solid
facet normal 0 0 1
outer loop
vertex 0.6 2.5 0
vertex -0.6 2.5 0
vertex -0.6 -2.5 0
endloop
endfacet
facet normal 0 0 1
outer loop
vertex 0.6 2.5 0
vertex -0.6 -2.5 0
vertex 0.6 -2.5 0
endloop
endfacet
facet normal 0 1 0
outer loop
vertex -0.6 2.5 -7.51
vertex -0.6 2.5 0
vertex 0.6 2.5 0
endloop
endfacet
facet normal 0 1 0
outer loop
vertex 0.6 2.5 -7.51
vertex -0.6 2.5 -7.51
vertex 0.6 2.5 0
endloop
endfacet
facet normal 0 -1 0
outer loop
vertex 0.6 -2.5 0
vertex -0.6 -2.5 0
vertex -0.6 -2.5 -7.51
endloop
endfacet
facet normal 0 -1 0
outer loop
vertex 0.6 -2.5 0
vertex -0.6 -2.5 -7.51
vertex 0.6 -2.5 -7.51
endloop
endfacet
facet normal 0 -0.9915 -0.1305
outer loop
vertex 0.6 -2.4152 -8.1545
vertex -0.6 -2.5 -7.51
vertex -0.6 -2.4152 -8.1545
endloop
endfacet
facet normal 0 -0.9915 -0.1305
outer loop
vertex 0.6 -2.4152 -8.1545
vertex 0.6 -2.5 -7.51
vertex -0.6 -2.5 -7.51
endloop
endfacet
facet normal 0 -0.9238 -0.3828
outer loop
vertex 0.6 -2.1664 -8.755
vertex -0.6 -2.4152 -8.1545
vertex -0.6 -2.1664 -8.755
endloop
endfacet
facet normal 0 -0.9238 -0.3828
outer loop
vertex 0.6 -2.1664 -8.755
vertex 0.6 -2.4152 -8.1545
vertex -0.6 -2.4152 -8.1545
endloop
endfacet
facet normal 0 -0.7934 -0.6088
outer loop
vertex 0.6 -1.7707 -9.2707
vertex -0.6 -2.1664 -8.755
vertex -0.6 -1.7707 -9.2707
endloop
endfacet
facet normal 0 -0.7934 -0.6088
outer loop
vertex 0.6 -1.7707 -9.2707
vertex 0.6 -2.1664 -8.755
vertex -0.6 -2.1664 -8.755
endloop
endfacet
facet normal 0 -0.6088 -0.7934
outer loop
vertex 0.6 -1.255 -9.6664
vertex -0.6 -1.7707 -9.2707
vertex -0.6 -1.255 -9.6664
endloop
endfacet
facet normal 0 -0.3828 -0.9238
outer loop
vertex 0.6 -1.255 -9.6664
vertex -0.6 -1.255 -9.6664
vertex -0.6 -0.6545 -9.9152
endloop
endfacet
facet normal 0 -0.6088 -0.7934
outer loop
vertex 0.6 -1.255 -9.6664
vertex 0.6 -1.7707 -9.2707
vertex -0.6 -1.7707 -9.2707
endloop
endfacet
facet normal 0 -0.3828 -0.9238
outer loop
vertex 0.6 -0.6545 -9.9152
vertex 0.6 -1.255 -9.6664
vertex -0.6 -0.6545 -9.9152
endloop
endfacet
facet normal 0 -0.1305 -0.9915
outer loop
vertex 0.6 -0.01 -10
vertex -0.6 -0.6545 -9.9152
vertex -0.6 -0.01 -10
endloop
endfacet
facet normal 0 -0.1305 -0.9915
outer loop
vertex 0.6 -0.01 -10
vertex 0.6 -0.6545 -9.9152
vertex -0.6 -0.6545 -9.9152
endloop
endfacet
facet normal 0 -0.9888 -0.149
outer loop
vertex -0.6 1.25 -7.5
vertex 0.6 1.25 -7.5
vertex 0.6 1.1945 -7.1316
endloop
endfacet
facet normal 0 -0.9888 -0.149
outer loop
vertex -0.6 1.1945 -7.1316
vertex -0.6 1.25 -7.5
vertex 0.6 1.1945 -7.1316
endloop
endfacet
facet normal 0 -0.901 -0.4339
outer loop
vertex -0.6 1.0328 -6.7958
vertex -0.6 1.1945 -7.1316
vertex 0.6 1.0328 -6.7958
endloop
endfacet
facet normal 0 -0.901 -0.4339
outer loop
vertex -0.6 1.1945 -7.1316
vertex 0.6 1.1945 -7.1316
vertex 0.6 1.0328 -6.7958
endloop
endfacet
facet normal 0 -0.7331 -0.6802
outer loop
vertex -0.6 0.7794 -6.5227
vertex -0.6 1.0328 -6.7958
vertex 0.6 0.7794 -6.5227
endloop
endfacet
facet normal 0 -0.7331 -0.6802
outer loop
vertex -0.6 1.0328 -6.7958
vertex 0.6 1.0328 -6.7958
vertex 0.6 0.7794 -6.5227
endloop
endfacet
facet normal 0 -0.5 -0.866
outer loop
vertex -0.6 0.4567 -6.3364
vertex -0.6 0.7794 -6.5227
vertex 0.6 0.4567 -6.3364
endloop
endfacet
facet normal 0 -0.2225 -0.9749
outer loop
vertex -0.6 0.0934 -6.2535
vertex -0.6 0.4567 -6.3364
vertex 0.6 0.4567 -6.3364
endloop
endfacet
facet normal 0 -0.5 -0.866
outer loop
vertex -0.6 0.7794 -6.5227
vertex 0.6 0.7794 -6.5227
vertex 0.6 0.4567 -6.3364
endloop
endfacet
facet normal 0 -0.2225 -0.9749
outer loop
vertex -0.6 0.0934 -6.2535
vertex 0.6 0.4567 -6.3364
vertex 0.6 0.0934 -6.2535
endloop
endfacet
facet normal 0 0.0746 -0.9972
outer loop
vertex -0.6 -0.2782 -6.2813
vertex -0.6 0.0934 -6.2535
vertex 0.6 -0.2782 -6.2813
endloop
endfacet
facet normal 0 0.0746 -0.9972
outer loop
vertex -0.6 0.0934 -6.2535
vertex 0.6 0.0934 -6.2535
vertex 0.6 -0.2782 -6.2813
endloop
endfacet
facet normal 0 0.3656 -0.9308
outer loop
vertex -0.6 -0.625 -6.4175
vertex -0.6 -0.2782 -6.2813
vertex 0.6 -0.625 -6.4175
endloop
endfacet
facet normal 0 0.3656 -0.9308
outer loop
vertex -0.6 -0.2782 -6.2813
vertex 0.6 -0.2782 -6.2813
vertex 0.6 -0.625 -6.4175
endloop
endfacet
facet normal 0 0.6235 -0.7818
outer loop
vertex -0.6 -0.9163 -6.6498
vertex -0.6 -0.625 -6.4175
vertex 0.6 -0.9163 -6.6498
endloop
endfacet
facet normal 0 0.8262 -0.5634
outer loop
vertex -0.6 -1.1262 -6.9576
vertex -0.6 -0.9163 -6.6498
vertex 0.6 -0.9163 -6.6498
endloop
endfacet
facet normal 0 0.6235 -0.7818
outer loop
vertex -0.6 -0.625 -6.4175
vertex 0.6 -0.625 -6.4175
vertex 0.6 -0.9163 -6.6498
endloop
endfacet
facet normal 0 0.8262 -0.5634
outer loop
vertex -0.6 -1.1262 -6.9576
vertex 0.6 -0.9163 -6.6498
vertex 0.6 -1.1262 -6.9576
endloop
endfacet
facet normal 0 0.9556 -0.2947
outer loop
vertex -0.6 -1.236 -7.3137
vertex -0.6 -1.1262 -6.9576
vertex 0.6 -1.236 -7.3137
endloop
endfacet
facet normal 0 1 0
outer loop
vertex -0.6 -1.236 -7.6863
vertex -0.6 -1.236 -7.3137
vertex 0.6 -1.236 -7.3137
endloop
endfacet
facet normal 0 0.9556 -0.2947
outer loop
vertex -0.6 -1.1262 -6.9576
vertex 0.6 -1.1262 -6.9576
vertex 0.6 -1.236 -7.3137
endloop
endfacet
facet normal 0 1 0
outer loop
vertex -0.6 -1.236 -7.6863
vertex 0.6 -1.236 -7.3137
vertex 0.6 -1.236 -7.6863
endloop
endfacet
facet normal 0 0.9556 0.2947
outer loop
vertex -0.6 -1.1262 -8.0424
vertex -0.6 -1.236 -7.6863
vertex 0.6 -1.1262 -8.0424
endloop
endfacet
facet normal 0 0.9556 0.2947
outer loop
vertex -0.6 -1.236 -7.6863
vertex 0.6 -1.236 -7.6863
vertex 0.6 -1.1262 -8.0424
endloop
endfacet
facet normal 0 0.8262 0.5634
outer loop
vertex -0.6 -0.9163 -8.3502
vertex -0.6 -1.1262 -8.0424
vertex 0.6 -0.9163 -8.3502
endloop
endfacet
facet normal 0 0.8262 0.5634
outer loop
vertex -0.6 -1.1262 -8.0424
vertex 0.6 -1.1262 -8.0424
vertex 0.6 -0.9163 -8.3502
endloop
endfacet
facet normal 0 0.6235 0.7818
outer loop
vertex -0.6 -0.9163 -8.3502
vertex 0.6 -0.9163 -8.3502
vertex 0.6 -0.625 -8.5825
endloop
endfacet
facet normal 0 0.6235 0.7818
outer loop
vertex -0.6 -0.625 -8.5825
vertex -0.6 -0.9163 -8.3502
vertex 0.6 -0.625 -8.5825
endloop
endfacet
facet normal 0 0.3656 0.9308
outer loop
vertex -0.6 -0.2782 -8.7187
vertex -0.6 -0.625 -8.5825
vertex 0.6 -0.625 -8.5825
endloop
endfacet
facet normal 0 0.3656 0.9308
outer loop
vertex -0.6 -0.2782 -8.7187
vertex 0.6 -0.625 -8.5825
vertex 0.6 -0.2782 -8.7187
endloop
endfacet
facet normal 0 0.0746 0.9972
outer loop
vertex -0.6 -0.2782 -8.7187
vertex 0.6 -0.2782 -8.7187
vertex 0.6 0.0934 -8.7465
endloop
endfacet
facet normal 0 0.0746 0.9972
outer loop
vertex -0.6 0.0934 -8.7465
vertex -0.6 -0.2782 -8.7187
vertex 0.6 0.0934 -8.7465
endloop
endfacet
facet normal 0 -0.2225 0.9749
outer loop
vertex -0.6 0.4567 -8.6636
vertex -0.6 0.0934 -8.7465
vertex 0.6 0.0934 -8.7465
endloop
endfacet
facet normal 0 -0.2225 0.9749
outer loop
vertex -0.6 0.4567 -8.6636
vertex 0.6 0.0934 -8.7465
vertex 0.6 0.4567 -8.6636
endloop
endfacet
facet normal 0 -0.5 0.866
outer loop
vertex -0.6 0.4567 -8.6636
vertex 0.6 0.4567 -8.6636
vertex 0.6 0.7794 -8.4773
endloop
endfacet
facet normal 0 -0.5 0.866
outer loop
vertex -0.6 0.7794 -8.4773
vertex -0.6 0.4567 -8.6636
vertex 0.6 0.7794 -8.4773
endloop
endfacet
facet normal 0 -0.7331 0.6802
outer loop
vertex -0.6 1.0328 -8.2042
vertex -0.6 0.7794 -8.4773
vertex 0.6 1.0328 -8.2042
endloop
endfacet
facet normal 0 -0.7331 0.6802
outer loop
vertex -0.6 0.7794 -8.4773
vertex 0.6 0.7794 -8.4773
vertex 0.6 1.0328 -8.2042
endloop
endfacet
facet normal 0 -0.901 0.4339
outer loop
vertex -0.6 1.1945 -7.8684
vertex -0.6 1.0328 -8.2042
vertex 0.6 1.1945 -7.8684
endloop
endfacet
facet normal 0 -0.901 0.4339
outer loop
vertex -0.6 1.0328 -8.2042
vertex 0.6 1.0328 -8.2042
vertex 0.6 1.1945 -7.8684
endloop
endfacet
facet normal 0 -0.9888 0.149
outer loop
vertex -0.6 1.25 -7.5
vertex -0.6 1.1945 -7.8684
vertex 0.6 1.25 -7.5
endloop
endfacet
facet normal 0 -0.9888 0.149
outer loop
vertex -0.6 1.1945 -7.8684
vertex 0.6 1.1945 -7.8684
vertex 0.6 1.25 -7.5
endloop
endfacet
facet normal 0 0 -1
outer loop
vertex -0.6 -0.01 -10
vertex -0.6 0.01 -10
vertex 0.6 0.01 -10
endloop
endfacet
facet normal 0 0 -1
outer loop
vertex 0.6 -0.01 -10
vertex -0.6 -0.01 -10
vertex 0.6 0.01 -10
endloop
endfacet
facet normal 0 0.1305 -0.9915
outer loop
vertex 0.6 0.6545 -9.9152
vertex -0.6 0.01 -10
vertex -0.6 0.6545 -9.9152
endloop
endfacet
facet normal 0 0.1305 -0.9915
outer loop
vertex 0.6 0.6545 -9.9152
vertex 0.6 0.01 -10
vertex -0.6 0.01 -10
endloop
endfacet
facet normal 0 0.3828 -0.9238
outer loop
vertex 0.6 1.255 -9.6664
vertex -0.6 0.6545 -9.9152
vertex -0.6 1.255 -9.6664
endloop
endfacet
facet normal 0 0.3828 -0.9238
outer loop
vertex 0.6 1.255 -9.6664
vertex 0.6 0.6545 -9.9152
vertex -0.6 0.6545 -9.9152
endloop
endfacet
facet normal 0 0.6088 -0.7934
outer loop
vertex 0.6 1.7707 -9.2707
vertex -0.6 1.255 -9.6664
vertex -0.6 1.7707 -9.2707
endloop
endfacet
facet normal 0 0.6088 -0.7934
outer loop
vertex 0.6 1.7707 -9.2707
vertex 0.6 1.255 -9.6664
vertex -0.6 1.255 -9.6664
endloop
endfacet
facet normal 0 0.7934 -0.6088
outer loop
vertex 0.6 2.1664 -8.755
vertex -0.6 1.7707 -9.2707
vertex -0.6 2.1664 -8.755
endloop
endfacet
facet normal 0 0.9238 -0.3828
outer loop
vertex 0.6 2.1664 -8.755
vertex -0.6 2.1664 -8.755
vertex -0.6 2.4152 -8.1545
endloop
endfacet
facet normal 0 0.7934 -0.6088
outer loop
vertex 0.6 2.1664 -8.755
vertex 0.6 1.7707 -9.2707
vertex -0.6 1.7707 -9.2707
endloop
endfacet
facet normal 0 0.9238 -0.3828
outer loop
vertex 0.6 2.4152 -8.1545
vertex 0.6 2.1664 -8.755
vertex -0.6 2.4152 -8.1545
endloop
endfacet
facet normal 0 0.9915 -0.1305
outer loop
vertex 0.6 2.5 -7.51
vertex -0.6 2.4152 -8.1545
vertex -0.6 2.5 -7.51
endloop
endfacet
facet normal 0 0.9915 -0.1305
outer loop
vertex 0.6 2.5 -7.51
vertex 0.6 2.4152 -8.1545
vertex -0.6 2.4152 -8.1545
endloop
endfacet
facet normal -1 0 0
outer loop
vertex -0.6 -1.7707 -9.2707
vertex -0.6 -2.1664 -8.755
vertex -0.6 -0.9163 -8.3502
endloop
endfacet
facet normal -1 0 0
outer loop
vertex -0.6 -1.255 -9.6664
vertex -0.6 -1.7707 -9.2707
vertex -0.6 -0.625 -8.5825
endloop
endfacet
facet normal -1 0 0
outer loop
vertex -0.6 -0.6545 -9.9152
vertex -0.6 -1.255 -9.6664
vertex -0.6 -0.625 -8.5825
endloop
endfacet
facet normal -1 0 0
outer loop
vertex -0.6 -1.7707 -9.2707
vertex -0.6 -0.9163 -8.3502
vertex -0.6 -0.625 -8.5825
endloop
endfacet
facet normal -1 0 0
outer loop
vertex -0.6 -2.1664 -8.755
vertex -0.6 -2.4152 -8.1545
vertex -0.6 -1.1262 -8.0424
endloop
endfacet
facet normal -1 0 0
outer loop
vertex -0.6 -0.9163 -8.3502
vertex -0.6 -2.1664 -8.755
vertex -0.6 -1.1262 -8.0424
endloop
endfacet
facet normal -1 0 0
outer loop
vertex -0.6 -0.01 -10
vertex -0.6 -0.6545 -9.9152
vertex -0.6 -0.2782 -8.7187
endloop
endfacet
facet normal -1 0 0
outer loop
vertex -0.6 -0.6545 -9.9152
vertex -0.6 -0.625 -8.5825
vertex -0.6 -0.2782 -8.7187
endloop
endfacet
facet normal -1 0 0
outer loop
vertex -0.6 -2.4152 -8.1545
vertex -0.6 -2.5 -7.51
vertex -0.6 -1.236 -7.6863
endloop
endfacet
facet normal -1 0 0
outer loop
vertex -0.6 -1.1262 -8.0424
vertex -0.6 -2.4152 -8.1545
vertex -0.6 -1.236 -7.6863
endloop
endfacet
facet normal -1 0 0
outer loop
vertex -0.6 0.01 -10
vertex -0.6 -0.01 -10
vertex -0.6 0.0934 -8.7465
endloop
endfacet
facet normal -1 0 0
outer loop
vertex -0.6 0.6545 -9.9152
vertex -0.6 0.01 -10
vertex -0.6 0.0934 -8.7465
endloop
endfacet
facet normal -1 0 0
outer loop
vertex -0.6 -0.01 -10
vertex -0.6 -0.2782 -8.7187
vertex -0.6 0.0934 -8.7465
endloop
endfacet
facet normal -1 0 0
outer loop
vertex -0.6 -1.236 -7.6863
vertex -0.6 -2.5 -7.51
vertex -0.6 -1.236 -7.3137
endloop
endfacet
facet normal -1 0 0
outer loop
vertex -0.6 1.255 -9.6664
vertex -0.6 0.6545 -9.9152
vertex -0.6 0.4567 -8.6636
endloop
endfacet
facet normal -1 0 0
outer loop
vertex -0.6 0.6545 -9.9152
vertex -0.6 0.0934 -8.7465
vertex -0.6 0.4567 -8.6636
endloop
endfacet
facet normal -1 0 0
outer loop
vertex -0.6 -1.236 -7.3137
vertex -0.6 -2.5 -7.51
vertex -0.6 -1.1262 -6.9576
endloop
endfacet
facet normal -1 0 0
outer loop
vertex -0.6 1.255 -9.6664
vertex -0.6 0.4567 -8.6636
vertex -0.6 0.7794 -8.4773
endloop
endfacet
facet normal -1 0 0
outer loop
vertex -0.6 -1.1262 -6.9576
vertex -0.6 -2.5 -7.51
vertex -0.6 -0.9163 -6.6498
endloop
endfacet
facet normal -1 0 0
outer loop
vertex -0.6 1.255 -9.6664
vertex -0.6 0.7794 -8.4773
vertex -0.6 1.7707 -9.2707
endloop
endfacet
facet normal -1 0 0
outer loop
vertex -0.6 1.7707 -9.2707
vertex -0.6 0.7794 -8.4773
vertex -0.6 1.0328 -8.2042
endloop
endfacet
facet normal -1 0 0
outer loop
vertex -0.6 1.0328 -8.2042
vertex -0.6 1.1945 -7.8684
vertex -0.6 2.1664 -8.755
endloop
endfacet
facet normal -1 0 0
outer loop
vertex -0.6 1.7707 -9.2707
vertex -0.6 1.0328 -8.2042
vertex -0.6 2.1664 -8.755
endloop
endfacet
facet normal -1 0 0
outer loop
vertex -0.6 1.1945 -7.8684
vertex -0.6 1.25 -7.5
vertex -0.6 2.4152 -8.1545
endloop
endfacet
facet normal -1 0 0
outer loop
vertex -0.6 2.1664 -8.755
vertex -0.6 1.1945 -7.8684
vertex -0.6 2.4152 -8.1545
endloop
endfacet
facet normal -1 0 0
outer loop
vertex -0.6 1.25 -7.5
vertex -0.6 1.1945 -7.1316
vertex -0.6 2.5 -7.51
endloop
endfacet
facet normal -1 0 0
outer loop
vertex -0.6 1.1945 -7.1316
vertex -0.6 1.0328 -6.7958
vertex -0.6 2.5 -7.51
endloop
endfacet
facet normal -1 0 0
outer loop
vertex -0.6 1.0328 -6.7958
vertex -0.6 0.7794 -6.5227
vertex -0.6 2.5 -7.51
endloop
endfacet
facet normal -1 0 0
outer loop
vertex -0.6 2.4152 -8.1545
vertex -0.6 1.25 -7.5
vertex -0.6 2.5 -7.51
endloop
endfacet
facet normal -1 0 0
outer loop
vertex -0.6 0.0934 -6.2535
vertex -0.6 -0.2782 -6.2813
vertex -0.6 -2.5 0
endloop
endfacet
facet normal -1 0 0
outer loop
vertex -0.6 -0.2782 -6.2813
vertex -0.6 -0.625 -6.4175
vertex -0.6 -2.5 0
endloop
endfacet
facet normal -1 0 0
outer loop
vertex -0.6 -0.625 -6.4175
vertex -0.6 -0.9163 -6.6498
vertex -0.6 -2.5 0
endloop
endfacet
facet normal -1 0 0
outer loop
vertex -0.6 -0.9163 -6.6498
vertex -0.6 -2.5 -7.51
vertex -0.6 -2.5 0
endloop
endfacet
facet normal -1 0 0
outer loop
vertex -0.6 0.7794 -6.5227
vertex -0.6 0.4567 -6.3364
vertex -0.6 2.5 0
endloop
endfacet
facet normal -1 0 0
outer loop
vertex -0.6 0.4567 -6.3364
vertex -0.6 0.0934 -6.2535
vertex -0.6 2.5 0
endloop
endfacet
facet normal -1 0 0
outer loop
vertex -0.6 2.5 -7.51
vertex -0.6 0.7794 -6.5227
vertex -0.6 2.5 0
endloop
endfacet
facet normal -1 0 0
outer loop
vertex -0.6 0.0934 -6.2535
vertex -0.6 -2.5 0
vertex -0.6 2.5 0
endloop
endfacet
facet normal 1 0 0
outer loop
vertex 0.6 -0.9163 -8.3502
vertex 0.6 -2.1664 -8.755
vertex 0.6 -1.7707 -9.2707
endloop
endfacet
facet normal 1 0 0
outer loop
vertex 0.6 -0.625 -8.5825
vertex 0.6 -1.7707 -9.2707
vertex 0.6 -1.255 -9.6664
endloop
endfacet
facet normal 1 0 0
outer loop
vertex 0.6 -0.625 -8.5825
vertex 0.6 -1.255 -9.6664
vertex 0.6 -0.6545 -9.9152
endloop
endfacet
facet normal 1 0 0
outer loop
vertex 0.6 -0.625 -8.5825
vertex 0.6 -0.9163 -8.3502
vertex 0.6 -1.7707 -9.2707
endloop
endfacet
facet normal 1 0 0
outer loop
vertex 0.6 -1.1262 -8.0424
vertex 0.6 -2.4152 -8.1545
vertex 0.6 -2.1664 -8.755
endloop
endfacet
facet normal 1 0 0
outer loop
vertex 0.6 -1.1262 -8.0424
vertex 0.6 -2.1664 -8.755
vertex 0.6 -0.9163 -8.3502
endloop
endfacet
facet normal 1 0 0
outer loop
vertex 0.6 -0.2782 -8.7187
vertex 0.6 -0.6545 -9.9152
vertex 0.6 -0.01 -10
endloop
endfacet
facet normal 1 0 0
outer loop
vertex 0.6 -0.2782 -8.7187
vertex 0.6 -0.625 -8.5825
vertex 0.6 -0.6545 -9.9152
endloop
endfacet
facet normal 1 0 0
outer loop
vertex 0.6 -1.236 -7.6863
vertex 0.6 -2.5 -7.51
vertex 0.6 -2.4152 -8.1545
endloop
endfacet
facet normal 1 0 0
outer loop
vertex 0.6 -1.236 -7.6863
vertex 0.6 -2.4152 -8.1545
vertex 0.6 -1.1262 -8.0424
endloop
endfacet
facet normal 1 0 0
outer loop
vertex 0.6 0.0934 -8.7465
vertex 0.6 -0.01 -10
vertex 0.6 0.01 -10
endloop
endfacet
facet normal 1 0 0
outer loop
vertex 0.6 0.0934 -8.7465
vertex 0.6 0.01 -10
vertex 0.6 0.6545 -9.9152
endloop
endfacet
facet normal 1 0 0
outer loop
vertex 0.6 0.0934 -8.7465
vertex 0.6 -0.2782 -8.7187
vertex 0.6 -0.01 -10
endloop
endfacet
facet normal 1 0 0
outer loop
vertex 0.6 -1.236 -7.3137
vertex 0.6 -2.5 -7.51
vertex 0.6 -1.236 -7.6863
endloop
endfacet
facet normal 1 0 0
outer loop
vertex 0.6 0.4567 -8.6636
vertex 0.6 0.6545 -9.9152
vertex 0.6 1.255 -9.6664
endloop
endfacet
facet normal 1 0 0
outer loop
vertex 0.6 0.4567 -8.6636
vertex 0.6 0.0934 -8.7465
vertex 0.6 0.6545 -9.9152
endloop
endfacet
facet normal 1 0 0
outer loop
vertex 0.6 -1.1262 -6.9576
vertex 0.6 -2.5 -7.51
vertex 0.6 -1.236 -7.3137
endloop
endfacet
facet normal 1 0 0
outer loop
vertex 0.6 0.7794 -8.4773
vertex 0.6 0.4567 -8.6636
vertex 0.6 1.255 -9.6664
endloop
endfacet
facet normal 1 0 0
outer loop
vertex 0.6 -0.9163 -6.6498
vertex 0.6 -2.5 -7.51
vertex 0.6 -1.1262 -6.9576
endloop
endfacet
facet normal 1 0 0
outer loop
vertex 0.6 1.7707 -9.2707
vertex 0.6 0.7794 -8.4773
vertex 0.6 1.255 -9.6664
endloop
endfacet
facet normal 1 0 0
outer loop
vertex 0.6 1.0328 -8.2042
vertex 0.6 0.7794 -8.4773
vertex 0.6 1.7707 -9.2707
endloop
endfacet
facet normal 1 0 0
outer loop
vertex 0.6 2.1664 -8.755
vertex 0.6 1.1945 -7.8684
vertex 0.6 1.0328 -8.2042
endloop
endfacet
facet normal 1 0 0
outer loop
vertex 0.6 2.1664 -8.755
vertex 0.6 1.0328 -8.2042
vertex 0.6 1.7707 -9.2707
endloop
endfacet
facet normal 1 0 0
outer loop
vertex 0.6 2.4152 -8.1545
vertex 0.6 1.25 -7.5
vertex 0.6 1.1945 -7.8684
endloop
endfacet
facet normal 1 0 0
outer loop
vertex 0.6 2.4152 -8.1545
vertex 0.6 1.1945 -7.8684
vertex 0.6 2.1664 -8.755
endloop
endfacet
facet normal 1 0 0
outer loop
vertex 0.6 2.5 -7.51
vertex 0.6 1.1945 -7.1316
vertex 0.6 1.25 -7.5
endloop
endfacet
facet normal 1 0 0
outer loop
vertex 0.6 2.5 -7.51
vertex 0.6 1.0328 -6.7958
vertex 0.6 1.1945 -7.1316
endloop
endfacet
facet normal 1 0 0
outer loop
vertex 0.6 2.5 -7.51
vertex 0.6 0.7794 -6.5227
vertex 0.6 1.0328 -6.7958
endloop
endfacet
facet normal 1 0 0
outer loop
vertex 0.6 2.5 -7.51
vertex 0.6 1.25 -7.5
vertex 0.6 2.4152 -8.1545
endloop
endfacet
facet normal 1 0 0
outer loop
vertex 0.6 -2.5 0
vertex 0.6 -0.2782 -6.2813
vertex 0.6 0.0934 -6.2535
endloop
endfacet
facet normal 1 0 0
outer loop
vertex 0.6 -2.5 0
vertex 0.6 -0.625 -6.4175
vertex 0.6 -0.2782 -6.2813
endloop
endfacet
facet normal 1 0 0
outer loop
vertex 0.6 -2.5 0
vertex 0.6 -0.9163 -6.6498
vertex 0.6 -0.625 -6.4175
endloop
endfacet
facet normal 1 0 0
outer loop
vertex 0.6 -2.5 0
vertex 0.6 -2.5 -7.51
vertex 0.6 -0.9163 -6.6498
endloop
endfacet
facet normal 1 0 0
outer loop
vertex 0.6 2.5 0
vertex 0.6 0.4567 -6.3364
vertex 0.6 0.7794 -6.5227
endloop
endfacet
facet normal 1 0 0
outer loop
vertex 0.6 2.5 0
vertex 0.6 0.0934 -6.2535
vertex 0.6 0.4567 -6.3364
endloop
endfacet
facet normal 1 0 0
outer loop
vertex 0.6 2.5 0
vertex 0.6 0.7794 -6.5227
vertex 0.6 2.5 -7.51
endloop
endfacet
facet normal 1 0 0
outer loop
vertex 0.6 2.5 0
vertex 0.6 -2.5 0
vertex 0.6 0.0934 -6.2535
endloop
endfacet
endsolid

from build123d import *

# Parameters (mm, degrees)
SKETCH_W     = 1.2
SKETCH_H     = 5
PAD_DEPTH    = 10
SKETCH001_R  = 1.25
POCKET_DEPTH = 1.2
FILLET_R     = 2.49


with BuildPart() as part:
    # Sketch → Pad (new body)
    with BuildSketch(Plane.XY):
        Rectangle(SKETCH_W, SKETCH_H)
    extrude(amount=-PAD_DEPTH)

    # Sketch001 (on Face3 of Pad) → Pocket (cut)
    with BuildSketch(Plane.YZ.offset(0.6)):
        with Locations((0, -7.5)):
            Circle(SKETCH001_R)
    extrude(amount=-POCKET_DEPTH, mode=Mode.SUBTRACT)

    # Fillet
    fillet_edges = [part.edges().sort_by_distance(p)[0] for p in [
        (0, -2.5, -10),
        (0, 2.5, -10),
    ]]
    fillet(fillet_edges, radius=FILLET_R)


solid = part.part
